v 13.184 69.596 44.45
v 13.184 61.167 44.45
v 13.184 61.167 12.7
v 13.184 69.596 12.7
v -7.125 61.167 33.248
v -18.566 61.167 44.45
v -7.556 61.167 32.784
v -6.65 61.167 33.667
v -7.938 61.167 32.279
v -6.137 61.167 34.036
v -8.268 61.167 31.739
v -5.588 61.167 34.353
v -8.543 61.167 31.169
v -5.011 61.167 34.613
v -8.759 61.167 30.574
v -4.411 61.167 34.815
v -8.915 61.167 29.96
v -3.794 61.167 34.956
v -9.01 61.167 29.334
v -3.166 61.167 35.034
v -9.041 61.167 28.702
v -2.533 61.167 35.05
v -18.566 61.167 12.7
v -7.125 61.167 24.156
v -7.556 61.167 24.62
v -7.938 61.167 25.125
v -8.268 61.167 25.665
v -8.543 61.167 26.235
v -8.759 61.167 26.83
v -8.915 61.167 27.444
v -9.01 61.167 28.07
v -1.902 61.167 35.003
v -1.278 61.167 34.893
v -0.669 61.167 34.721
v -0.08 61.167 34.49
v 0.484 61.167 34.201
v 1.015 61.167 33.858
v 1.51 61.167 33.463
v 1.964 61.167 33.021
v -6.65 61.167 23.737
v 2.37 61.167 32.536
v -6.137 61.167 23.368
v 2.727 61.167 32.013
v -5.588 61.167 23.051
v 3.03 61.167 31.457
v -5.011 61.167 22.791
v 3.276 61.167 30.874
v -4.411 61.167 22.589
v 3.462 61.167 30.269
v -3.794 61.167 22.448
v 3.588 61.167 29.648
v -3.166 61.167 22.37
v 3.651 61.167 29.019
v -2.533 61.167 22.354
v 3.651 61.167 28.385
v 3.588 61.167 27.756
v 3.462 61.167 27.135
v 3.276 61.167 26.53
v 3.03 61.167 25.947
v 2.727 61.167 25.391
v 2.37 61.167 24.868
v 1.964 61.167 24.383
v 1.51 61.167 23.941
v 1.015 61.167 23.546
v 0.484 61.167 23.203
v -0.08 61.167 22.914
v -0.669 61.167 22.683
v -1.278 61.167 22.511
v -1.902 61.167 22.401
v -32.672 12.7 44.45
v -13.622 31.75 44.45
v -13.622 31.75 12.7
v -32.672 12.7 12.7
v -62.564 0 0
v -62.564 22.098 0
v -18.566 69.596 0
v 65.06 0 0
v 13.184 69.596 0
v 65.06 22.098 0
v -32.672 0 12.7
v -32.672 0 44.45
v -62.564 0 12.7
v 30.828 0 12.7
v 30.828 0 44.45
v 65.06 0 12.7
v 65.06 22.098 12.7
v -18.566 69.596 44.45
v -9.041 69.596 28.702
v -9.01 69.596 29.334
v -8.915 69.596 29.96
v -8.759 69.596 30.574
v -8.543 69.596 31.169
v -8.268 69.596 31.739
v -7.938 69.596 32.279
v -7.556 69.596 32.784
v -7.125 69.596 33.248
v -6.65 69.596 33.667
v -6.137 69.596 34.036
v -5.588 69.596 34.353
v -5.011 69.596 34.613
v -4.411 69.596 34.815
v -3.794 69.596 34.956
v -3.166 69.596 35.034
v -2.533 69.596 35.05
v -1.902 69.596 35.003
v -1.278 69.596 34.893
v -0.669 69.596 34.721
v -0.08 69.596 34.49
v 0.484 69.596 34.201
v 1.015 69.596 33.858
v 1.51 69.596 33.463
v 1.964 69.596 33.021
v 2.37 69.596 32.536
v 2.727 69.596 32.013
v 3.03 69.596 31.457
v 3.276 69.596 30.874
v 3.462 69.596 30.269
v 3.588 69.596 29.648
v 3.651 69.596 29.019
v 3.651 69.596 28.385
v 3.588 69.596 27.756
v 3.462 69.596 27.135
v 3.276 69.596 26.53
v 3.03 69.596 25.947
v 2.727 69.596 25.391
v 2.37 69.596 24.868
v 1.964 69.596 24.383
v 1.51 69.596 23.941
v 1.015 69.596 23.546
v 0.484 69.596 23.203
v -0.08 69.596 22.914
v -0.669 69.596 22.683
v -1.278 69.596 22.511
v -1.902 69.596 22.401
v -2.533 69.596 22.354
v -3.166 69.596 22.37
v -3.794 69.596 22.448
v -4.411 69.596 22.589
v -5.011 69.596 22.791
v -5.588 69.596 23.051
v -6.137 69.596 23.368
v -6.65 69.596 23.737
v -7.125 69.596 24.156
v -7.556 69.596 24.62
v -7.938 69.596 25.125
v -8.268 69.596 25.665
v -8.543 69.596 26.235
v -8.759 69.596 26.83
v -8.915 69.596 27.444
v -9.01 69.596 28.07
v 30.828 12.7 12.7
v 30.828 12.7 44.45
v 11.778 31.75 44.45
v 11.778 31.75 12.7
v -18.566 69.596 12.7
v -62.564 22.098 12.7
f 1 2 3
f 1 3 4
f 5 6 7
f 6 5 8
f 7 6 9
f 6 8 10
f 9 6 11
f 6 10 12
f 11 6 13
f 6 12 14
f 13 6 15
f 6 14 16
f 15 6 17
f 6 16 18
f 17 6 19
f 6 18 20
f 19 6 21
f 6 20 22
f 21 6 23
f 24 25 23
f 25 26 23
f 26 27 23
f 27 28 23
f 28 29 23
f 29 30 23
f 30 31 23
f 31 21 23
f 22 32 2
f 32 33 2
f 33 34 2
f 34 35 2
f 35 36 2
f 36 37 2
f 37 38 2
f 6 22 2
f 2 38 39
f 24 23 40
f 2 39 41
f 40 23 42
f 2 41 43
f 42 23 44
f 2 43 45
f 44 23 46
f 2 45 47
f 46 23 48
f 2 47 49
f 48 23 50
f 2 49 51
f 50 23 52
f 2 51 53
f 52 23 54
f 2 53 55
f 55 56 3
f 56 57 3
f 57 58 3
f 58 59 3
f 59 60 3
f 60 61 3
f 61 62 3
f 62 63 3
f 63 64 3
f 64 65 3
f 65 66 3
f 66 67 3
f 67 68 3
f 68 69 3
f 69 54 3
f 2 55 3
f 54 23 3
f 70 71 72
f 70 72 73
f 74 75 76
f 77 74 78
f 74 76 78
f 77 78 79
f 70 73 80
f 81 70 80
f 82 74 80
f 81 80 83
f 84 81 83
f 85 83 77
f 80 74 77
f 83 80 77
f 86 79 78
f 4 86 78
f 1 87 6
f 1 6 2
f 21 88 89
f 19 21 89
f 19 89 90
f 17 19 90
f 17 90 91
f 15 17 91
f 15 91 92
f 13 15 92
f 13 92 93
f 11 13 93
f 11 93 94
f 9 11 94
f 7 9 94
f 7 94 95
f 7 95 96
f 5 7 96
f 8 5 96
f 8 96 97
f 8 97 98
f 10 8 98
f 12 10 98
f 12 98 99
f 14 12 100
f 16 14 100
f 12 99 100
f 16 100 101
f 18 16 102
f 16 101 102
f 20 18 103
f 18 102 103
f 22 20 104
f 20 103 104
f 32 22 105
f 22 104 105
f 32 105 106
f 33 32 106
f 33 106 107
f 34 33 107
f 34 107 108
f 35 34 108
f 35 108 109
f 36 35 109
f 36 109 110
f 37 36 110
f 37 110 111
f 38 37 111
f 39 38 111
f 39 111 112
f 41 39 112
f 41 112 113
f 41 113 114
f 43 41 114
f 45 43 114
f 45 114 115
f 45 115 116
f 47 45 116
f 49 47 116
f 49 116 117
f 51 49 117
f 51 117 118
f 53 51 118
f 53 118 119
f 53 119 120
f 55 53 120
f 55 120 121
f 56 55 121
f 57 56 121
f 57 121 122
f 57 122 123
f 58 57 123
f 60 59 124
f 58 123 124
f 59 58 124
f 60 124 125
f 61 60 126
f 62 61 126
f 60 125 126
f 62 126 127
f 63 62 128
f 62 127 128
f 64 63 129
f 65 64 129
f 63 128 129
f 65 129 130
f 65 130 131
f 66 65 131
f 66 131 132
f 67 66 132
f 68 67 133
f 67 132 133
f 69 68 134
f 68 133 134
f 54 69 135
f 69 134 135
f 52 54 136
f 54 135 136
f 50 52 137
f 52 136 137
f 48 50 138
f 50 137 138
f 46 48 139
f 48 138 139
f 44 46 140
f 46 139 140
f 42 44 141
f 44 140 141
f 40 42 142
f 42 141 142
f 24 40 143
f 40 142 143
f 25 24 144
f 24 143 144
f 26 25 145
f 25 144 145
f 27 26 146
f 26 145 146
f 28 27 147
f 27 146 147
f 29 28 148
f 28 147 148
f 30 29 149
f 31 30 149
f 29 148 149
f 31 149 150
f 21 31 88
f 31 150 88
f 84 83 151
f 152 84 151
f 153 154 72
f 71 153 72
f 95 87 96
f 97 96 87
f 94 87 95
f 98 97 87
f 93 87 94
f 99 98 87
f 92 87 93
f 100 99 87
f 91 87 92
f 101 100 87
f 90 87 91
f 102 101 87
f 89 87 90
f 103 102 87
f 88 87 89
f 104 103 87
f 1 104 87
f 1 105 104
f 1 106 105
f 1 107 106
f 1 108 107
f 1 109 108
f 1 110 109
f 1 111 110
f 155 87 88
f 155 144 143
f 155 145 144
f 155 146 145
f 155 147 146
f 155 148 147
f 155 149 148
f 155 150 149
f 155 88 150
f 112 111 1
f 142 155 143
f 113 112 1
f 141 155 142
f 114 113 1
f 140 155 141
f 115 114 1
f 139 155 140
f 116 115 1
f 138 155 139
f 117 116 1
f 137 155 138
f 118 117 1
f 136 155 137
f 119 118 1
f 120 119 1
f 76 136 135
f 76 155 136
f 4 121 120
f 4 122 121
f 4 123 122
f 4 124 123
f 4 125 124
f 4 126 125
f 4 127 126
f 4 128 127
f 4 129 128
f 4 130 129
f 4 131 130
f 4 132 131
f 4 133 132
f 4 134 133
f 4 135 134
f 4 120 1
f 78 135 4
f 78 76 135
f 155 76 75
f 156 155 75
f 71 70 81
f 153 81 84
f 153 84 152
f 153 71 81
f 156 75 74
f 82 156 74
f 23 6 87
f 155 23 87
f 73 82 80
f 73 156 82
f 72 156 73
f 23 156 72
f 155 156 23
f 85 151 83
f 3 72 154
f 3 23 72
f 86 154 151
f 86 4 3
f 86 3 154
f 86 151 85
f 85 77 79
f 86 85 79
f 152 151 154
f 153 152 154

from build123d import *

# Parameters (mm, degrees)
F1_DEPTH = 12.7
F2_DEPTH = 44.45
F0_W     = 31.75
F0_H     = 8.428902
F3_DEPTH = 44.45
F4_R     = 6.35
F5_DEPTH = 14.224


with BuildPart() as f1:
    # F0 (on Top) → F1 (new body)
    with BuildSketch(Plane.XY):
        Polygon((-62.563881, 0), (-61.939803, 0), (-32.672367, 0), (-32.672367, 12.7), (-13.622367, 31.75), (11.777633, 31.75), (30.827633, 12.7), (30.827633, 0), (65.060197, 0), (65.060197, 22.098), (13.183661, 69.596), (13.183661, 61.167098), (-18.566339, 61.167098), (-18.566339, 69.596), (-62.563881, 22.098), align=None)
    extrude(amount=F1_DEPTH)

    # F0 (on Top) → F2 (join)
    with BuildSketch(Plane.XY):
        Polygon((-32.672367, 12.7), (-32.672367, 0), (30.827633, 0), (30.827633, 12.7), (11.777633, 31.75), (-13.622367, 31.75), align=None)
    extrude(amount=F2_DEPTH)

    # F0 (on Top) → F3 (join)
    with BuildSketch(Plane.XY):
        with Locations((-2.691339, 65.381549)):
            Rectangle(F0_W, F0_H)
    extrude(amount=F3_DEPTH)

    # F4 (on face) → F5 (cut)
    with BuildSketch(Plane(origin=(0, 69.596, 0), x_dir=(-1, 0, 0), z_dir=(0, 1, 0))):
        with Locations((2.691339, 28.702)):
            Circle(F4_R)
    extrude(amount=-F5_DEPTH, mode=Mode.SUBTRACT)


solid = f1.part
